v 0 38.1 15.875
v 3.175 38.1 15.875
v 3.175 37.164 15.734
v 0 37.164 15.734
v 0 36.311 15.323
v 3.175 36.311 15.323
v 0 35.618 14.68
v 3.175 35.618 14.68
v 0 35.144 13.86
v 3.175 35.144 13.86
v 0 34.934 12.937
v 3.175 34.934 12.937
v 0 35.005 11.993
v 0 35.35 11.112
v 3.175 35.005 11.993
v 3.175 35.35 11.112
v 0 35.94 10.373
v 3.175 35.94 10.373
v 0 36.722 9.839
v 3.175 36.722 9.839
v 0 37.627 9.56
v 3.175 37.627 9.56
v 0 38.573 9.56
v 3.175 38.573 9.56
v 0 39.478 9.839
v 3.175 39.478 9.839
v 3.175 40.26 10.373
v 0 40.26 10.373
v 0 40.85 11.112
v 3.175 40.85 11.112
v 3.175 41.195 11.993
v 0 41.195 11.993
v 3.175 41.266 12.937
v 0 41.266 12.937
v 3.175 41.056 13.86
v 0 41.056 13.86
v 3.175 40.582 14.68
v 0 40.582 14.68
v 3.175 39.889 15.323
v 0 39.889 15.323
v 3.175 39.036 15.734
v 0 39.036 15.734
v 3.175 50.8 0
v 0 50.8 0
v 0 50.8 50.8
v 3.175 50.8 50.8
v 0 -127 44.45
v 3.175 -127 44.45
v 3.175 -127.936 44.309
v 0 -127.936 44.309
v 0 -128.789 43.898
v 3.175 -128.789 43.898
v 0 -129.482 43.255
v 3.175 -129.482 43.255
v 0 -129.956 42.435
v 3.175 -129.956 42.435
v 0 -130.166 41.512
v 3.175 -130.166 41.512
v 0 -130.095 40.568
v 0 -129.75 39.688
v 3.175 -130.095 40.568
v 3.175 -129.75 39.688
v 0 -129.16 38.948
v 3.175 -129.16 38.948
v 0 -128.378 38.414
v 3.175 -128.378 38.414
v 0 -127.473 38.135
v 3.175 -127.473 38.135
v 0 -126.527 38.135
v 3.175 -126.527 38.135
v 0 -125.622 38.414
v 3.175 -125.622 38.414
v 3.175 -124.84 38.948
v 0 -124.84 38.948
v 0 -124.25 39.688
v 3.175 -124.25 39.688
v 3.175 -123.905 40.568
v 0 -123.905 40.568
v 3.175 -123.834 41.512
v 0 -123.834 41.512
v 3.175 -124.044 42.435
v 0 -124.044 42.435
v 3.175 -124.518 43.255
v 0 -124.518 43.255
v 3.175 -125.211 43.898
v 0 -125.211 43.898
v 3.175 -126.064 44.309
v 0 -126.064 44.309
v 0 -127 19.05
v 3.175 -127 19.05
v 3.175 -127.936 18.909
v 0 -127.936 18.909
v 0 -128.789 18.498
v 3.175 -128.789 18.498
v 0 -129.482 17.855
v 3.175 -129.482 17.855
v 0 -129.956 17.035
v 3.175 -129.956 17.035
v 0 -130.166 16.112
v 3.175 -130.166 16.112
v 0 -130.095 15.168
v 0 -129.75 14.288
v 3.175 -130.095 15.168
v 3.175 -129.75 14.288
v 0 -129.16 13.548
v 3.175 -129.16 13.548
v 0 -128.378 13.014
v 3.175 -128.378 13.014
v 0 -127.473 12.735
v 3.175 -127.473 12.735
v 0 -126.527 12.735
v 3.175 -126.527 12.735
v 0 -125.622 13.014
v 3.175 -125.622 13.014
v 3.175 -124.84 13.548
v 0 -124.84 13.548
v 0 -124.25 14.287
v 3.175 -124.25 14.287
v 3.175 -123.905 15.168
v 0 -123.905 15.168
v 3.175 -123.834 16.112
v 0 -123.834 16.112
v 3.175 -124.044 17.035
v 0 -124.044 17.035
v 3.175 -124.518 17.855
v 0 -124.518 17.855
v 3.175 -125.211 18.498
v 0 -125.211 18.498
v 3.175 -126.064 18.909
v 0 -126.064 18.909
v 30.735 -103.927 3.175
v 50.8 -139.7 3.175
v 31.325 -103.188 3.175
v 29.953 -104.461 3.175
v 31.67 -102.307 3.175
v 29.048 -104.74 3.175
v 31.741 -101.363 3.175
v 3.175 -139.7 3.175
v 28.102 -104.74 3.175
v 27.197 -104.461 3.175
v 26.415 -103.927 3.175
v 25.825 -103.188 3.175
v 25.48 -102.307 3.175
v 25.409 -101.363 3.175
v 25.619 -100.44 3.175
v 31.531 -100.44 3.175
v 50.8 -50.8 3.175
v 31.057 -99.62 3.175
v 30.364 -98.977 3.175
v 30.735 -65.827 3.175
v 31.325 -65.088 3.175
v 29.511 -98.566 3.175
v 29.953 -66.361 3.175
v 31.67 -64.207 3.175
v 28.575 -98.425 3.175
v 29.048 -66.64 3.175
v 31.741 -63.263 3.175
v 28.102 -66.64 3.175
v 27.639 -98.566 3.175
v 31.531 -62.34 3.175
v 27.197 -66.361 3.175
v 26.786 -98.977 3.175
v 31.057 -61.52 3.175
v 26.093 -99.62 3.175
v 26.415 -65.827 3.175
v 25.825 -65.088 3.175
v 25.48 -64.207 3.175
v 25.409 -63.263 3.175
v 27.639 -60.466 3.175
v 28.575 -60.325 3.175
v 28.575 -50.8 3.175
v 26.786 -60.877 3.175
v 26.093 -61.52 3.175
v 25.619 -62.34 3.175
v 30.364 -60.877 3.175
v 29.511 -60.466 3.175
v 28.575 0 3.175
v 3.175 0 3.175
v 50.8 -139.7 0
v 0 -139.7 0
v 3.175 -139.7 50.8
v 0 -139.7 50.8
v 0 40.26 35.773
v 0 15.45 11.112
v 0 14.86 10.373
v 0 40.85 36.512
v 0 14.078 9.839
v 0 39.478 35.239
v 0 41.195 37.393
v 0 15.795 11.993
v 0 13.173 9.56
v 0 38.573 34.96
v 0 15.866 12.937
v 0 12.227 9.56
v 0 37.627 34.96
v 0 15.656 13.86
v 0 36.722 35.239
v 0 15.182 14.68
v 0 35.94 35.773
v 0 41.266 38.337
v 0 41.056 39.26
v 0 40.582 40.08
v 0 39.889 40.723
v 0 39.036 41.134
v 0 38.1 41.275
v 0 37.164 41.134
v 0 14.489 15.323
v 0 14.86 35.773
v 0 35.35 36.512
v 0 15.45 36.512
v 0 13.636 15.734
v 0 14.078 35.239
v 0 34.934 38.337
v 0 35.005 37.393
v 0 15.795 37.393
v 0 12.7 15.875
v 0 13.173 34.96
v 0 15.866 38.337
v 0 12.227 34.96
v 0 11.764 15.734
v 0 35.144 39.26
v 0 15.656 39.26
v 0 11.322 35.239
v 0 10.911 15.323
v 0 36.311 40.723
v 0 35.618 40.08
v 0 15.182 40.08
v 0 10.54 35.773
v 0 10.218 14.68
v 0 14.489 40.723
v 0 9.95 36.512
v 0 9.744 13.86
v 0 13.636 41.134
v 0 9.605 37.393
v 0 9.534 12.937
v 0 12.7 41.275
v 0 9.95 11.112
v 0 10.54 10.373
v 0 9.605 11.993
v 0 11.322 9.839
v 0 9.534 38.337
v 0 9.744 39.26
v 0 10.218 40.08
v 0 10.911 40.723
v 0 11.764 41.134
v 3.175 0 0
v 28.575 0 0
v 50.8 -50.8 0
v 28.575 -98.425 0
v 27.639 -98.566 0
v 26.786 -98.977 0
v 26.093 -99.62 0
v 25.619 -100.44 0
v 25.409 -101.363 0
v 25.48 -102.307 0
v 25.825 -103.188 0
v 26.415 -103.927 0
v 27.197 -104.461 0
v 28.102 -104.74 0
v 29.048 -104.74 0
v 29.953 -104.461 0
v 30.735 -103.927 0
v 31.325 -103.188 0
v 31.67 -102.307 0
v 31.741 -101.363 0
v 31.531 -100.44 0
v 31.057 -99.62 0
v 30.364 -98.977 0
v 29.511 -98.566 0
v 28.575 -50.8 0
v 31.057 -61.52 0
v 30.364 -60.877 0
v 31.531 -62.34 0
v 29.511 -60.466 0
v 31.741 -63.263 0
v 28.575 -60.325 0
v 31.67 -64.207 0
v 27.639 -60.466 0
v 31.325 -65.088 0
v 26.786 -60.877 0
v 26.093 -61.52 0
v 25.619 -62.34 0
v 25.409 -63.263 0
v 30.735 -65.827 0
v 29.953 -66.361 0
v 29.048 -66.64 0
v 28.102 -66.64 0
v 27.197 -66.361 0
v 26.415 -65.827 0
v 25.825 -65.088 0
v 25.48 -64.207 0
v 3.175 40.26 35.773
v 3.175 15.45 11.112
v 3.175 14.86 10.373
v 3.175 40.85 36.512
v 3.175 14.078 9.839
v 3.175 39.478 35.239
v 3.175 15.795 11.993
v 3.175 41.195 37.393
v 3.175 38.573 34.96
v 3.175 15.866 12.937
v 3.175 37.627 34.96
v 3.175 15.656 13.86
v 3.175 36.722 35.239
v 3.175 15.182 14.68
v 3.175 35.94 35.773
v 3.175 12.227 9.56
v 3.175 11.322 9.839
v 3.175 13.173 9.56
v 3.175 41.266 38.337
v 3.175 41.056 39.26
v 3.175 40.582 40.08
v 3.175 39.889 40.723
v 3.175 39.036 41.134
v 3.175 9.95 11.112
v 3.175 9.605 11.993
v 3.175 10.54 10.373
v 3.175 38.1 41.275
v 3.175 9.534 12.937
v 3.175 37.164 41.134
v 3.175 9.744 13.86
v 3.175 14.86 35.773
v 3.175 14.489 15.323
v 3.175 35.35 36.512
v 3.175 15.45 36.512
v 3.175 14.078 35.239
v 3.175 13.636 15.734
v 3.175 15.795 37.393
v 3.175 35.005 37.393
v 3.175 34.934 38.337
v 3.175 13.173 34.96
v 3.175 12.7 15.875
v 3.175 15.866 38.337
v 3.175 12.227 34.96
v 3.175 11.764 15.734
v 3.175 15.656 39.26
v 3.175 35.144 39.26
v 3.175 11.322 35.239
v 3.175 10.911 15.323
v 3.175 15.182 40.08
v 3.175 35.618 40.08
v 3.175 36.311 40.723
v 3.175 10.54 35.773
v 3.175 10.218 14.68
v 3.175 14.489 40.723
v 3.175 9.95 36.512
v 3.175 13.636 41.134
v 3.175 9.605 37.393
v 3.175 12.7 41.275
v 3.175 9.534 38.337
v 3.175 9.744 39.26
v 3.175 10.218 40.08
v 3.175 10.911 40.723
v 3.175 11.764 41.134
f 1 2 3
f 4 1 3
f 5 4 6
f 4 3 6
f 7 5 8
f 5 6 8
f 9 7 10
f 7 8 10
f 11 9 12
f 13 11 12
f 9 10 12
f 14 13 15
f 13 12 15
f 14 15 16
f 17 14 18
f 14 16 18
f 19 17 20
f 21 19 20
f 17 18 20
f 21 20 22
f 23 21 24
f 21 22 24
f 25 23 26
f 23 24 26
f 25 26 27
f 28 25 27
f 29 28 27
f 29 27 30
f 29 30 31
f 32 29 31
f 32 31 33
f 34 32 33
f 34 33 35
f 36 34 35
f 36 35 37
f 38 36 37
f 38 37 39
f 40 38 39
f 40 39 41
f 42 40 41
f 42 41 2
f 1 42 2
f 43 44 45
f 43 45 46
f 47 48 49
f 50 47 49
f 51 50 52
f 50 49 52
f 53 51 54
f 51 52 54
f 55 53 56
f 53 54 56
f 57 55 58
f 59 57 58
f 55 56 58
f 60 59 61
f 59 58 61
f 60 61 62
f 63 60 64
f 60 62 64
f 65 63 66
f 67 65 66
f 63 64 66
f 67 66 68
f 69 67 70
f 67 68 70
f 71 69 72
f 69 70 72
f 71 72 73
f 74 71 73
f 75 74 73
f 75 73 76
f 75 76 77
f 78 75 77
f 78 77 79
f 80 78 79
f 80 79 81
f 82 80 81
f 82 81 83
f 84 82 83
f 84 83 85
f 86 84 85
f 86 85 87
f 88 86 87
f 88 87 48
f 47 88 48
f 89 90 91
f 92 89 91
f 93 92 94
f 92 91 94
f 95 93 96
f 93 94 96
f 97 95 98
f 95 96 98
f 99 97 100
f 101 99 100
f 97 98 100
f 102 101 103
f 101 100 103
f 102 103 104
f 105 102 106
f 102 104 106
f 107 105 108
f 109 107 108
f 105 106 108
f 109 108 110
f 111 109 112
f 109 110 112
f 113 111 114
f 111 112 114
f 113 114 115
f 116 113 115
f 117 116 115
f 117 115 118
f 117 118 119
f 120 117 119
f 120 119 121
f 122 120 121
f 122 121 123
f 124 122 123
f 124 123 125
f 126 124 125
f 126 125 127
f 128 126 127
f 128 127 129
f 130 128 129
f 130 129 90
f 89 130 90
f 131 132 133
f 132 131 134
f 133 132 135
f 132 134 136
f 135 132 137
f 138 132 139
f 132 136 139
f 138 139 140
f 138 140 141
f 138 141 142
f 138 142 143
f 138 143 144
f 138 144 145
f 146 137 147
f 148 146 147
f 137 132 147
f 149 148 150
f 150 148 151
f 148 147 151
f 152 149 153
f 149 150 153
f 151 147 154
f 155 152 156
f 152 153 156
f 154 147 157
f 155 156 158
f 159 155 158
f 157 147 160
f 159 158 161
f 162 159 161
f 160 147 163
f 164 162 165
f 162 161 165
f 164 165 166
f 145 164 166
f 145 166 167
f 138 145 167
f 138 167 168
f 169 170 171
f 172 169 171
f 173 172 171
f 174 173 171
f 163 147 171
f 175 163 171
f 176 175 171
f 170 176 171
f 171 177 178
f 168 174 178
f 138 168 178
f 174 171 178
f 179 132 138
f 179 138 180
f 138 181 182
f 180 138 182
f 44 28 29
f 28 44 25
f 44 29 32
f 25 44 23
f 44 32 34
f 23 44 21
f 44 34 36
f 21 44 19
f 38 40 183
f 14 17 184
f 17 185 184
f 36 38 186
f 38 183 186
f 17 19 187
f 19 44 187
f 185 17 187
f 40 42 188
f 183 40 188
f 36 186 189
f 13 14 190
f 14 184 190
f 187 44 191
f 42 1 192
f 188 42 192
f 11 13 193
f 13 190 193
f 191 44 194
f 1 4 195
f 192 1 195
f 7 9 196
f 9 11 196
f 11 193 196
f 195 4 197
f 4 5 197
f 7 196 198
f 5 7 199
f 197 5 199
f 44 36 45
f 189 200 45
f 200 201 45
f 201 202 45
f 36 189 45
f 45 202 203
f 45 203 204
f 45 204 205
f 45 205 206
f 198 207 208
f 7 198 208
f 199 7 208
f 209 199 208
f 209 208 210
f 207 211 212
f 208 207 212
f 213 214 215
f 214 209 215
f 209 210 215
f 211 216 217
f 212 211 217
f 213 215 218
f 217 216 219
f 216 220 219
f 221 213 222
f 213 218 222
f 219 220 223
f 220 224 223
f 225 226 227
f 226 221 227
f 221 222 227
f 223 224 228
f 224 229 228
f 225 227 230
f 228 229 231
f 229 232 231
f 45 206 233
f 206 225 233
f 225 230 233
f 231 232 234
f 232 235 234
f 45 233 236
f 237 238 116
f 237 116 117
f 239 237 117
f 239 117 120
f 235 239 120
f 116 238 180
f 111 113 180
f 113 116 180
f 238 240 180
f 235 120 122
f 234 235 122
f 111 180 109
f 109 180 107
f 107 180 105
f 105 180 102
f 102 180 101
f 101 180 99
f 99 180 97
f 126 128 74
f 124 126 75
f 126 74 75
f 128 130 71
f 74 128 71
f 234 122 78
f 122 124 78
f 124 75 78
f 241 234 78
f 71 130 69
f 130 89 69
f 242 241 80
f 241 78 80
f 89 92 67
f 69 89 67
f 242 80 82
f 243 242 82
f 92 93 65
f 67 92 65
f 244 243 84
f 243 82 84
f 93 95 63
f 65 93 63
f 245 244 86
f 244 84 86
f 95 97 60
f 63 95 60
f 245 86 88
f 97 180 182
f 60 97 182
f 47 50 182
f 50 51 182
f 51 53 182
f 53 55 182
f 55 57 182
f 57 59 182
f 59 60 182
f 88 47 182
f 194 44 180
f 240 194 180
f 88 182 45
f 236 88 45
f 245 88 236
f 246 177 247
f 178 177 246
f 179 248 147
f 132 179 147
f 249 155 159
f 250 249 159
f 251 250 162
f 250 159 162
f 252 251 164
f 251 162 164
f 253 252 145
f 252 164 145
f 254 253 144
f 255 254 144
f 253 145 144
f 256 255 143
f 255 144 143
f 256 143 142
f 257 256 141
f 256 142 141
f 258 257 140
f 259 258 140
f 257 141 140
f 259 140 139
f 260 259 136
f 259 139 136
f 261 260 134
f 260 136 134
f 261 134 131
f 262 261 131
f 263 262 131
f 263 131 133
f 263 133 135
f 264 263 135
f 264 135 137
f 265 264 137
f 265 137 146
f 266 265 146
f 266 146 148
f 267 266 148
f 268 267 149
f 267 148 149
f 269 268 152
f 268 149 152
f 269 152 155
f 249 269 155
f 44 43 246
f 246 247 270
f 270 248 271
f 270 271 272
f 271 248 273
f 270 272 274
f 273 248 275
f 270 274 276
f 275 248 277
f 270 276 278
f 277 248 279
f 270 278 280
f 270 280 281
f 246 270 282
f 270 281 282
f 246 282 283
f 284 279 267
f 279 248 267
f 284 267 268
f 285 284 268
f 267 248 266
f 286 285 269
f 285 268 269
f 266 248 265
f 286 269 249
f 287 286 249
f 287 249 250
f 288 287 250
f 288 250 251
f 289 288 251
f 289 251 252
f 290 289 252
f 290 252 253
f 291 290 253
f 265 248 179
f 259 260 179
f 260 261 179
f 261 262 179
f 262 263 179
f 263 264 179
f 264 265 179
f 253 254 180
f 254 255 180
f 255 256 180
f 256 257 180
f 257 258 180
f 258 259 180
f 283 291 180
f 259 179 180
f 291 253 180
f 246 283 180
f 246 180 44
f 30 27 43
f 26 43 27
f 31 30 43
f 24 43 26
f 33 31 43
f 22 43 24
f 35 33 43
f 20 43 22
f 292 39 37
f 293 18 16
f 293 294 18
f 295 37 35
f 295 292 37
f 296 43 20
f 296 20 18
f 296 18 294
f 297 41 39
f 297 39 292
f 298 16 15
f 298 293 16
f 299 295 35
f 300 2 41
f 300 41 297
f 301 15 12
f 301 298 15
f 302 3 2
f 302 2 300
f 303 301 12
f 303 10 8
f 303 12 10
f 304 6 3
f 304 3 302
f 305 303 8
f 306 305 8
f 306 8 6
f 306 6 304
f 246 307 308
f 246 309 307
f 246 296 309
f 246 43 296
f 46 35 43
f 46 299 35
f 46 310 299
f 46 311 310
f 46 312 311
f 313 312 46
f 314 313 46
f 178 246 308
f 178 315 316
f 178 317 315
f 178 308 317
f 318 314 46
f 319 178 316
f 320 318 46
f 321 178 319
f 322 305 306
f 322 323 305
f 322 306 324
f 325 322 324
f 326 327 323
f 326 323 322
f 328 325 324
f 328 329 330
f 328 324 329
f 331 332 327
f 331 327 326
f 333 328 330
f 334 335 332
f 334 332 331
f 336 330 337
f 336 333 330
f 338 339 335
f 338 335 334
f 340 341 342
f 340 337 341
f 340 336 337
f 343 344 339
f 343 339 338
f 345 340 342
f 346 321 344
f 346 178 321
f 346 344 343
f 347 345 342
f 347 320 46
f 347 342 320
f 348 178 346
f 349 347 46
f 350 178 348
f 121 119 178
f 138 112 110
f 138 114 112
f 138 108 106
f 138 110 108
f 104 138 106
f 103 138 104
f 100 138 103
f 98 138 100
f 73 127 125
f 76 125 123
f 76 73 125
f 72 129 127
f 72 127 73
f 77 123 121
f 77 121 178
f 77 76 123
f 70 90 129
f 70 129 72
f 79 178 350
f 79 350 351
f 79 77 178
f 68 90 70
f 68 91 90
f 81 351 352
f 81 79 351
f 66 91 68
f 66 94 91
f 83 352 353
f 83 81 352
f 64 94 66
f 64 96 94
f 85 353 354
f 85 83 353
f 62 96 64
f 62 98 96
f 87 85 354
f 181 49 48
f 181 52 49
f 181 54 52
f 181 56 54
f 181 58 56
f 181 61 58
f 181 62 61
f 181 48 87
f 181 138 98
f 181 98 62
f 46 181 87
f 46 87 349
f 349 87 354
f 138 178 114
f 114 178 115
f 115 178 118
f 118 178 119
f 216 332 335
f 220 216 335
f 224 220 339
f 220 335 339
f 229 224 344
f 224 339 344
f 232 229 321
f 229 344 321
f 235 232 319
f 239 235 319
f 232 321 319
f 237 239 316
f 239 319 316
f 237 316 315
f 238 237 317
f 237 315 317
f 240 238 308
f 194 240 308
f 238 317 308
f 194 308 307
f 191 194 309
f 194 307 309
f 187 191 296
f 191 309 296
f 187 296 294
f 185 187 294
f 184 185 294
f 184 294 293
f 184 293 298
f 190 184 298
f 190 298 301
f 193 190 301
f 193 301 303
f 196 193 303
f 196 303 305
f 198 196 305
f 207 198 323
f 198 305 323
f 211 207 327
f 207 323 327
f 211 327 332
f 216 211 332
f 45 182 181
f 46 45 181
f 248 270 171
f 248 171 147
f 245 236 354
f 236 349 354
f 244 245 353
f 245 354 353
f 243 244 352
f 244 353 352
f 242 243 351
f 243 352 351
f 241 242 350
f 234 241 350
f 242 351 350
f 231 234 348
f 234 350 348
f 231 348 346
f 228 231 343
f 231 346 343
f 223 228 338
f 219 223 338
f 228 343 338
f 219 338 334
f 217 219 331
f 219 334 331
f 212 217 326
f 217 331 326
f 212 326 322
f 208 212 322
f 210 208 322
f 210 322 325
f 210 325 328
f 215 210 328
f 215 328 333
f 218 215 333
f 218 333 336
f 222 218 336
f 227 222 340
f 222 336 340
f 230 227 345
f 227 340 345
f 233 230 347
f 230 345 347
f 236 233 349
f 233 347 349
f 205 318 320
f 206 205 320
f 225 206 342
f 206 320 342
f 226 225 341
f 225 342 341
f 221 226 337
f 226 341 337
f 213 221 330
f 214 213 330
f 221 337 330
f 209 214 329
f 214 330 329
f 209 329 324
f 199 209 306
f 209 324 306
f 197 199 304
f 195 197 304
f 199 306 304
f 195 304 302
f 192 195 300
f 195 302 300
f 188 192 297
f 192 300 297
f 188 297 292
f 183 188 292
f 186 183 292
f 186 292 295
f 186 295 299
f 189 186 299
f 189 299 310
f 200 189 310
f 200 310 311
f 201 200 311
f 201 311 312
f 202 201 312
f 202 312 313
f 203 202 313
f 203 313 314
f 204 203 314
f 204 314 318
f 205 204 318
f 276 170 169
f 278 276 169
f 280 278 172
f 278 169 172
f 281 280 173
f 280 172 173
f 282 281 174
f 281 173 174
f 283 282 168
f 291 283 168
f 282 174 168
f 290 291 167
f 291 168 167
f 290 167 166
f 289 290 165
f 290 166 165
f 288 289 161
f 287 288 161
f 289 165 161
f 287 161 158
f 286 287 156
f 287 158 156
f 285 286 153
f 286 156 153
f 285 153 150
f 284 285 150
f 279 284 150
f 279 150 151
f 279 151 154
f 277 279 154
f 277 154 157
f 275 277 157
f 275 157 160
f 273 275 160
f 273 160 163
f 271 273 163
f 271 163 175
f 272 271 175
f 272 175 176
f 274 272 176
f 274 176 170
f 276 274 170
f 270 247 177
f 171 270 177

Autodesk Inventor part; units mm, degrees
ref_plane "YZ Plane" through (0, 0, 0) normal (1, 0, 0) x (0, 1, 0)
ref_plane "XZ Plane" through (0, 0, 0) normal (0, 1, 0) x (-1, 0, 0)
ref_plane "XY Plane" through (0, 0, 0) normal (0, 0, 1) x (1, 0, 0)
sketch "Sketch1" plane through (0, 0, 0) normal (0, 1, 0) x (-1, 0, 0)
  line L0 (0, 0) -> (-3.175, 0)
  line L1 (-3.175, 0) -> (-3.175, 50.8)
  line L2 (-3.175, 50.8) -> (0, 50.8)
  line L3 (0, 50.8) -> (0, 0)
  line L4 (0, 0) -> (-50.8, 0)
  line L5 (-50.8, 0) -> (-50.8, 3.175)
  line L6 (-50.8, 3.175) -> (0, 3.175)
  line L7 (0, 3.175) -> (0, 0)
  dimension "d0" = 3.175
  dimension "d1" = 50.8
  dimension "d2" = 50.8
  dimension "d3" = 3.175
extrude "Extrusion1" add sketch "Sketch1" against normal blind 139.7
sketch "Sketch3" plane through (0, 0, 0) normal (-1, 0, 0) x (0, 0, 1)
  line L0 (0, 0) -> (50.8, 0) projected
  line L1 (0, 0) -> (0, -139.7) projected
  line L2 (50.8, -139.7) -> (0, -139.7) projected
  line L3 (50.8, 0) -> (50.8, -139.7) projected
  point P0 (15.875, -127)
  point P1 (41.275, -127)
  dimension "d17" = 9.525
  dimension "d18" = 12.7
  dimension "d19" = 12.7
  dimension "d20" = 15.875
hole "Hole2" at (0, -127, 15.875) at (0, -127, 41.275) direction (1, 0, 0) diameter 6.35 end through all
sketch "Sketch4" plane through (50.8, 0, 0) normal (0, 0, -1) x (-1, 0, 0)
  line L0 (50.8, -139.7) -> (0, -139.7) projected
  line L1 (50.8, 0) -> (50.8, -139.7) projected
  line L2 (0, 0) -> (50.8, 0) projected
  line L3 (0, 0) -> (0, -139.7) projected
  point P0 (22.225, -63.5)
  point P1 (22.225, -101.6)
  dimension "d28" = 28.575
  dimension "d29" = 28.575
  dimension "d30" = 63.5
  dimension "d31" = 101.6
hole "Hole3" at (28.575, -63.5, 0) at (28.575, -101.6, 0) direction (0, 0, 1) diameter 6.35 end through all
sketch "Sketch5" plane through (0, 0, 0) normal (0, 1, 0) x (1, 0, 0)
  line L0 (0, 0) -> (0, -50.8) projected
  line L1 (0, -50.8) -> (3.175, -50.8) projected
  line L2 (3.175, -50.8) -> (3.175, -3.175) projected
  line L3 (3.175, -3.175) -> (50.8, -3.175) projected
  line L4 (50.8, -3.175) -> (50.8, 0) projected
  line L5 (50.8, 0) -> (0, 0) projected
  line L6 (0, 0) -> (3.175, 0)
  line L7 (3.175, 0) -> (3.175, -50.8)
  line L8 (3.175, -50.8) -> (0, -50.8)
  line L9 (0, -50.8) -> (0, 0)
extrude "Extrusion2" add sketch "Sketch5" along normal blind 50.8 contours L5 L7 L2 L1 L0
sketch "Sketch6" plane through (0, 0, 0) normal (0, 1, 0) x (1, 0, 0)
  line L0 (3.175, 0) -> (3.175, -3.175) projected
  line L1 (3.175, -3.175) -> (50.8, -3.175) projected
  line L2 (50.8, -3.175) -> (50.8, 0) projected
  line L3 (50.8, 0) -> (3.175, 0) projected
  line L4 (50.8, 0) -> (28.575, 0)
  line L5 (28.575, 0) -> (28.575, -3.175)
  line L6 (28.575, -3.175) -> (50.8, -3.175)
  line L7 (50.8, -3.175) -> (50.8, 0)
  point P0 (0, 0)
  dimension "d41" = 22.225
extrude "Extrusion3" cut sketch "Sketch6" against normal blind 50.8 contours L3 L2 L1 L5
sketch "Sketch7" plane through (0, -139.7, 0) normal (-1, 0, 0) x (0, 0, 1)
  circle A0 centre (15.875, 12.7) radius 3.175 projected
  circle A1 centre (41.275, 12.7) radius 3.175 projected
  line L0 (0, 190.5) -> (0, 0) projected
  line L1 (50.8, 0) -> (0, 0) projected
  line L2 (50.8, 0) -> (50.8, 190.5) projected
  line L3 (0, 190.5) -> (50.8, 190.5) projected
  point P0 (0, 139.7)
  point P1 (12.7, 177.8)
  point P2 (38.1, 177.8)
  point P3 (38.1, 152.4)
  point P4 (12.7, 152.4)
  dimension "d44" = 12.7
  dimension "d45" = 38.1
  dimension "d46" = 38.1
  dimension "d47" = 12.7
  dimension "d48" = 12.7
  dimension "d49" = 12.7
  dimension "d50" = 12.7
  dimension "d51" = 12.7
hole "Hole4" at (0, 38.1, 12.7) at (0, 38.1, 38.1) at (0, 12.7, 38.1) at (0, 12.7, 12.7) direction (1, 0, 0) diameter 6.35 end through all
properties part number "2x2 angle vertical left"
